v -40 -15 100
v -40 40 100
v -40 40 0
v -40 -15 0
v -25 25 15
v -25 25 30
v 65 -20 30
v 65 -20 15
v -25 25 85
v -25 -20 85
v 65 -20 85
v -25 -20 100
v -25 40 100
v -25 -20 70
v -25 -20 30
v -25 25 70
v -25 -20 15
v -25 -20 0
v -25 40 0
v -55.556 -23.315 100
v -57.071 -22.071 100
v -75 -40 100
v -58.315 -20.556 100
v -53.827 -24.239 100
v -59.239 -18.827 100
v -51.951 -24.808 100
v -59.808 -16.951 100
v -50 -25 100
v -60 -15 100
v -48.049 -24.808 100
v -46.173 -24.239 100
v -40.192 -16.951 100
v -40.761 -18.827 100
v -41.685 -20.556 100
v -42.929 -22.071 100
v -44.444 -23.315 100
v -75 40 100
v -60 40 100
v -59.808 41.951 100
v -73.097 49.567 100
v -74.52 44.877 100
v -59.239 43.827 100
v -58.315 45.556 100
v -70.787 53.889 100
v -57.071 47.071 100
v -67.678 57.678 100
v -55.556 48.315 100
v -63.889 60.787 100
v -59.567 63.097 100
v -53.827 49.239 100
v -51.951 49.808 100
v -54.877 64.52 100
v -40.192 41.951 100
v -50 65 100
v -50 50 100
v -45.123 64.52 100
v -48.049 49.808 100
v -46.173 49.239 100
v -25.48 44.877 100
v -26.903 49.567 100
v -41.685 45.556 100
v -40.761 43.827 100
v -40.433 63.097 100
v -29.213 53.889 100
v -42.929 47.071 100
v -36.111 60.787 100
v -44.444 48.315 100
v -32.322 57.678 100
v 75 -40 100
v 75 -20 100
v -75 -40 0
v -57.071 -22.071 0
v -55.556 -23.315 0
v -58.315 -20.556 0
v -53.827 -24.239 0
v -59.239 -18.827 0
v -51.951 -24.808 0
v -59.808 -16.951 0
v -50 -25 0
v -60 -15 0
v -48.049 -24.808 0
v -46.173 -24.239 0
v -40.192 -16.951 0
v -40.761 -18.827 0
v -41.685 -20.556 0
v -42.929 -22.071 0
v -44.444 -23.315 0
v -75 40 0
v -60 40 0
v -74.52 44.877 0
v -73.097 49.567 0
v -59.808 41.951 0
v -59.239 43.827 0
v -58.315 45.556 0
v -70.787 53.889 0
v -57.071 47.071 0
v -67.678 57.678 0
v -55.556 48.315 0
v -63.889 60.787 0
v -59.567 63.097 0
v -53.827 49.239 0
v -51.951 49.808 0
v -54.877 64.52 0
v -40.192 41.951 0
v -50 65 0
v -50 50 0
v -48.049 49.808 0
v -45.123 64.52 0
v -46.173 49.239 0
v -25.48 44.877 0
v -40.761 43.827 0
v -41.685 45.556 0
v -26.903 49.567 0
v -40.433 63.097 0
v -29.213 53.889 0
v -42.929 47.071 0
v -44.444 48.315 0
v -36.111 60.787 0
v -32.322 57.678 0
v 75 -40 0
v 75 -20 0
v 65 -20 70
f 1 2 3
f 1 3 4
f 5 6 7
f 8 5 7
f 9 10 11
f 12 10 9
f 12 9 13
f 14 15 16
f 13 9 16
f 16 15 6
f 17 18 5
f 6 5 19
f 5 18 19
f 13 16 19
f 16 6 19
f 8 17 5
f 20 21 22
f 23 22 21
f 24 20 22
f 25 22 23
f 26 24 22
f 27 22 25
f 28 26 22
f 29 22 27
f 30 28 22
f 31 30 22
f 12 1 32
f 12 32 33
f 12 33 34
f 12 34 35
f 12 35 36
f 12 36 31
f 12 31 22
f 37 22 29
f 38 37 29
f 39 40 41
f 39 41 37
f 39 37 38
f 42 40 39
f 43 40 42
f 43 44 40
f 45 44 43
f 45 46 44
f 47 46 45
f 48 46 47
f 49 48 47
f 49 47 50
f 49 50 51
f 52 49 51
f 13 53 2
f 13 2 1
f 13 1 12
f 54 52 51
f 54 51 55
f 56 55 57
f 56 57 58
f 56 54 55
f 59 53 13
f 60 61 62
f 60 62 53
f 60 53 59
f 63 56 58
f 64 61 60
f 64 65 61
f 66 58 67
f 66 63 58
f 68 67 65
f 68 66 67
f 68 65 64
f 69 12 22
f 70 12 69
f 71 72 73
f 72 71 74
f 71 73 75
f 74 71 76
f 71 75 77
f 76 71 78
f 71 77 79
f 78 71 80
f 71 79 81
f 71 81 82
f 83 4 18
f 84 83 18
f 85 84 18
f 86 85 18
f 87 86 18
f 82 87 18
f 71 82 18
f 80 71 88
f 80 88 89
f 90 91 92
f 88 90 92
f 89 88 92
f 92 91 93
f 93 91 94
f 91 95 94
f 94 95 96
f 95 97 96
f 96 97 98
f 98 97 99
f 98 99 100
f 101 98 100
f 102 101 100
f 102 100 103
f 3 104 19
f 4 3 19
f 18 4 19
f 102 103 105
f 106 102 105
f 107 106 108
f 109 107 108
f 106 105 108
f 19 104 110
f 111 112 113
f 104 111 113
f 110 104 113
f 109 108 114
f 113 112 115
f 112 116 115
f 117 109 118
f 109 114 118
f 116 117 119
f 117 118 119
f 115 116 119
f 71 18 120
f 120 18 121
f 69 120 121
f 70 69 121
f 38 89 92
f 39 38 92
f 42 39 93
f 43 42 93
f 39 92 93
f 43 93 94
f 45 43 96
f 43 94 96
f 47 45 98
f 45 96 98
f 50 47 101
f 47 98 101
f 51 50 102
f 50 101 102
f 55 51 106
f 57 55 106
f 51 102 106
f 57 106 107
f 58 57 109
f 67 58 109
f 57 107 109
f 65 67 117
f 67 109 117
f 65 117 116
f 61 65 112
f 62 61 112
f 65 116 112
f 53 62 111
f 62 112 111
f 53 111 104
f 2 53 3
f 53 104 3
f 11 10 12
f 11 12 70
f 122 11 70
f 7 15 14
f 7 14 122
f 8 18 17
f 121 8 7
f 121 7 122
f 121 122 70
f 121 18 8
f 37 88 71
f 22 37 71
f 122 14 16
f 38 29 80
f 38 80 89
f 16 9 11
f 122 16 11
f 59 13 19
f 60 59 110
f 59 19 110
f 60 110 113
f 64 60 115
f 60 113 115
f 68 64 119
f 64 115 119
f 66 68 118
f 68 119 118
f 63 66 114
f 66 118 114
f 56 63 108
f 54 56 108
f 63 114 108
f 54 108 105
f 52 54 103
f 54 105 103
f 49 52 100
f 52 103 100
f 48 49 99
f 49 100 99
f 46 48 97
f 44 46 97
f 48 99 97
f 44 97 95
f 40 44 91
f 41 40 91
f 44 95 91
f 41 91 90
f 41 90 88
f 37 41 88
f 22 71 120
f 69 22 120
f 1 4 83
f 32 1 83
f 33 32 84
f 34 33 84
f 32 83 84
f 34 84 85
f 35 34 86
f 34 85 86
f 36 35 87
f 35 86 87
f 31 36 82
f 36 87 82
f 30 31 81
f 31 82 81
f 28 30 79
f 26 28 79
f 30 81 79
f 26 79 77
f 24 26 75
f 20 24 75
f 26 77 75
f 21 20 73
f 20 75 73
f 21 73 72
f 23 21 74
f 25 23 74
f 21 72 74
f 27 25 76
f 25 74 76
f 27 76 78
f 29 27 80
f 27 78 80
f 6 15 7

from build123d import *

# Parameters (mm, degrees)
SKETCH1_W           = 100
SKETCH1_H           = 20
BOSS_EXTRUDE1_DEPTH = 100
SKETCH2_W           = 90
SKETCH2_H           = 15
BOSS_EXTRUDE2_DEPTH = 45
CUT_EXTRUDE1_DEPTH  = 86


with BuildPart() as part:
    # Sketch1 → Boss-Extrude1 (new body)
    with BuildSketch(Plane.XY):
        with Locations((25, -30)):
            Rectangle(SKETCH1_W, SKETCH1_H)
        with BuildLine():
            ThreePointArc((-60, 17.087121525), (-70.916500663, 26.306936062), (-75, 40))
            Line((-75, 40), (-75, -40))
            Line((-75, -40), (-25, -40))
            Line((-25, -40), (-25, -20))
            Line((-25, -20), (-25, 40))
            ThreePointArc((-25, 40), (-29.083499337, 26.306936062), (-40, 17.087121525))
            Line((-40, 17.087121525), (-40, -15))
            ThreePointArc((-40, -15), (-50, -25), (-60, -15))
            Line((-60, -15), (-60, 17.087121525))
        make_face()
        with BuildLine():
            ThreePointArc((-40, 17.087121525), (-29.083499337, 26.306936062), (-25, 40))
            Line((-25, 40), (-40, 40))
            Line((-40, 40), (-40, 17.087121525))
        make_face()
        with BuildLine():
            ThreePointArc((-25, 40), (-50, 65), (-75, 40))
            Line((-75, 40), (-60, 40))
            ThreePointArc((-60, 40), (-50, 50), (-40, 40))
            Line((-40, 40), (-25, 40))
        make_face()
        with BuildLine():
            Line((-60, 40), (-75, 40))
            ThreePointArc((-75, 40), (-70.916500663, 26.306936062), (-60, 17.087121525))
            Line((-60, 17.087121525), (-60, 40))
        make_face()
    extrude(amount=BOSS_EXTRUDE1_DEPTH)

    # Sketch2 → Boss-Extrude2 (add)
    with BuildSketch(Plane(origin=(0, -20, 0), x_dir=(1, 0, 0), z_dir=(0, 1, 0))):
        with Locations((20, -77.5)):
            Rectangle(SKETCH2_W, SKETCH2_H)
        with Locations((20, -22.5)):
            Rectangle(SKETCH2_W, SKETCH2_H)
    extrude(amount=BOSS_EXTRUDE2_DEPTH)

    # Sketch3 → Cut-Extrude1 (cut, through all)
    with BuildSketch(Plane.XY.offset(85)):
        Polygon((-25, 25), (65, -20), (65, 25), align=None)
    extrude(amount=-CUT_EXTRUDE1_DEPTH, mode=Mode.SUBTRACT)


solid = part.part
